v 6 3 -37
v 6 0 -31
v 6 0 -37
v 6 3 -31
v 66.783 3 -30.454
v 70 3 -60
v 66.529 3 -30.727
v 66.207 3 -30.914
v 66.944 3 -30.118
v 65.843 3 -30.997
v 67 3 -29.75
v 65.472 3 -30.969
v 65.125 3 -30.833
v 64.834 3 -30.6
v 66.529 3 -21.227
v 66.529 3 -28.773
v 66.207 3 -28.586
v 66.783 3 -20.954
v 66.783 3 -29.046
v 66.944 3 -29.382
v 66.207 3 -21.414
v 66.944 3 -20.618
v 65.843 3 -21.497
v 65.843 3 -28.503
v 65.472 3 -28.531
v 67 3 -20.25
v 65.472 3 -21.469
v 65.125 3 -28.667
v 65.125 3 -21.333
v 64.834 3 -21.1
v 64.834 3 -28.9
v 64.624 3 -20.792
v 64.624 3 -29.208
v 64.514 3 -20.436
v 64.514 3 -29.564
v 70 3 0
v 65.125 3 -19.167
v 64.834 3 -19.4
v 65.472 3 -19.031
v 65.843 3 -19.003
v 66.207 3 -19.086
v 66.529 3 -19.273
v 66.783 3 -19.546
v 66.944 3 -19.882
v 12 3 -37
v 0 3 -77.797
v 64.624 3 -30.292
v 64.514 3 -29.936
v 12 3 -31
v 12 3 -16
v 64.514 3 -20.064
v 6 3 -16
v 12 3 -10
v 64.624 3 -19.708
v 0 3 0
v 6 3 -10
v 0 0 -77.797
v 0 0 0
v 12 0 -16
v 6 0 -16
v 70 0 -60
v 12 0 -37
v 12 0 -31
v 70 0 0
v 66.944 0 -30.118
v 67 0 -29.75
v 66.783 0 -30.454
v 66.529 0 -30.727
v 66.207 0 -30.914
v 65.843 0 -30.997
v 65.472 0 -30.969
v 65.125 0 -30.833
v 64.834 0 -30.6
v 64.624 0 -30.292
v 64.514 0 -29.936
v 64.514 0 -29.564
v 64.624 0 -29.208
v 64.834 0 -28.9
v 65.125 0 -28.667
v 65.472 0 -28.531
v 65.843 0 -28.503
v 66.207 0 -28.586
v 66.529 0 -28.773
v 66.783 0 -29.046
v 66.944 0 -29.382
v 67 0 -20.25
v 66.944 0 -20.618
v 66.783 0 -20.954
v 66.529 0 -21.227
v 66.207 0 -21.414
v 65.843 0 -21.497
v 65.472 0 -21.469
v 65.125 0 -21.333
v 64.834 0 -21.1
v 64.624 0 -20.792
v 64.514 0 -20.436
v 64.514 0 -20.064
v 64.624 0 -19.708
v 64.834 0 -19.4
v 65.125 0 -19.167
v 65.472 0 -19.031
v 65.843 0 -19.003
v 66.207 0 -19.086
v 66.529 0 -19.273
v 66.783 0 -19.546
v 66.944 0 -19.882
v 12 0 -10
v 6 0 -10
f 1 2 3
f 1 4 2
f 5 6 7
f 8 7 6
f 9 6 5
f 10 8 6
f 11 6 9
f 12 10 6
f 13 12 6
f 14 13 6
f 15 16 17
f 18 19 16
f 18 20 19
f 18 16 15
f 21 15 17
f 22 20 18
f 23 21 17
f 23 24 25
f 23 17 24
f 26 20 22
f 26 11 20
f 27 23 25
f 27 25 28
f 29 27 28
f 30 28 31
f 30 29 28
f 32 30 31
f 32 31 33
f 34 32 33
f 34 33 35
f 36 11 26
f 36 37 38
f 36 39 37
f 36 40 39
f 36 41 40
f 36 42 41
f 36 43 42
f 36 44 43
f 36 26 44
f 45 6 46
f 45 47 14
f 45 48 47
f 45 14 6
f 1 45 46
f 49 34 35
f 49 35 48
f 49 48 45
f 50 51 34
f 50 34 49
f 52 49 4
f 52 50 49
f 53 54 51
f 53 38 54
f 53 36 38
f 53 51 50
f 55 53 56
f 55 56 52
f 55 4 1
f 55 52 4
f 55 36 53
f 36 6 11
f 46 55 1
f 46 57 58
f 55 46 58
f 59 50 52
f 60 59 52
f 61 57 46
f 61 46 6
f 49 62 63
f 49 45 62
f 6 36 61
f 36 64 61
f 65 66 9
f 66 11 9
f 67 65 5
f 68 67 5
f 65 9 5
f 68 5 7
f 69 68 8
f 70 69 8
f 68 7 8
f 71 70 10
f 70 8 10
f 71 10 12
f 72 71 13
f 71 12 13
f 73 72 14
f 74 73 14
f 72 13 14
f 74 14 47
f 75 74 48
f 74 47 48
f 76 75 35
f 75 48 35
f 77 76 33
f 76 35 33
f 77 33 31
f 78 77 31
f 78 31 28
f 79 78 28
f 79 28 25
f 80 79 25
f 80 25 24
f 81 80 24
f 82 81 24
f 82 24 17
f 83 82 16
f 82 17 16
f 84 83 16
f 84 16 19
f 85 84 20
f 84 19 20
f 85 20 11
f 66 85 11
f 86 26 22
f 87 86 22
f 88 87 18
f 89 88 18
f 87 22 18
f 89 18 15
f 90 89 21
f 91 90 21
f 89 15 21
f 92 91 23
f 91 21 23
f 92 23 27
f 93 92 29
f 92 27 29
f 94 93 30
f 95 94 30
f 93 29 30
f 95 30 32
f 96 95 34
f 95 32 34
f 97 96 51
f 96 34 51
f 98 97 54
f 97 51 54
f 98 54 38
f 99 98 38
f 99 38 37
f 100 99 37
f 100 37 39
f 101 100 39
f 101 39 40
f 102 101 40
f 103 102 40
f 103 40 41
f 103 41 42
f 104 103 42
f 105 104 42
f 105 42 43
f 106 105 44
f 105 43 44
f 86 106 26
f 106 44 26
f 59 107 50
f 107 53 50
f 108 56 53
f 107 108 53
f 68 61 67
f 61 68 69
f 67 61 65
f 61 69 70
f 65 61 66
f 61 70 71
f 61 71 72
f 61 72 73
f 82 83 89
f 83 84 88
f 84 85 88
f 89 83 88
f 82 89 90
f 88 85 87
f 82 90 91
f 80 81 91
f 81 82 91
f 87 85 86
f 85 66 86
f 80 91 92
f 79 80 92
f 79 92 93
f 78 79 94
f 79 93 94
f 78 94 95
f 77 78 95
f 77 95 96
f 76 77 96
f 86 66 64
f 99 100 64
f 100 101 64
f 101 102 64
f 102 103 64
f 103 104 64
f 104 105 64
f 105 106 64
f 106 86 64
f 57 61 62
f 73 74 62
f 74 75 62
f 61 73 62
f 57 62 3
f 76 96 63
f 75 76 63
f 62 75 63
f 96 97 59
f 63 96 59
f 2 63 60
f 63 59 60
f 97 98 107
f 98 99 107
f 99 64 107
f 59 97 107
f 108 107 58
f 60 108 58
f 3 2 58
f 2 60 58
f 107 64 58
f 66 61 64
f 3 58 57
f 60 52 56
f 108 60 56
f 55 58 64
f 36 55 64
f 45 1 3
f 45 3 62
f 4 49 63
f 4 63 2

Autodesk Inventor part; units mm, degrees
ref_plane "YZ Plane" through (0, 0, 0) normal (1, 0, 0) x (0, 1, 0)
ref_plane "XZ Plane" through (0, 0, 0) normal (0, 1, 0) x (-1, 0, 0)
ref_plane "XY Plane" through (0, 0, 0) normal (0, 0, 1) x (1, 0, 0)
sketch "Sketch1" plane through (0, 0, 0) normal (0, 1, 0) x (-1, 0, 0)
  line L0 (0, 0) -> (-70, 0)
  line L1 (-70, 0) -> (-70, -60)
  line L2 (-70, -60) -> (0, -60)
  line L3 (0, -60) -> (0, 0)
  line L4 (0, -60) -> (0, -77.7966)
  line L5 (0, -77.7966) -> (-70, -60)
  dimension "d0" = 70
  dimension "d1" = 60
  dimension "d23" = 14.264
extrude "Extrusion1" add sketch "Sketch1" along normal blind 3
sketch "Sketch3" plane through (0, 3, 0) normal (0, 1, 0) x (1, 0, 0)
  circle A0 centre (65.75, 20.25) radius 1.25
  circle A1 centre (65.75, 29.75) radius 1.25
  line L0 (70, 0) -> (70, 60) projected
  line L1 (0, 0) -> (70, 0) projected
  line L2 (6, 10) -> (12, 10)
  line L3 (12, 10) -> (12, 16)
  line L4 (12, 16) -> (6, 16)
  line L5 (6, 16) -> (6, 10)
  line L6 (6, 37) -> (12, 37)
  line L7 (12, 37) -> (12, 31)
  line L8 (12, 31) -> (6, 31)
  line L9 (6, 31) -> (6, 37)
  line L10 (0, 77.7966) -> (0, 0) projected
  dimension "d15" = 2.5
  dimension "d16" = 4.25
  dimension "d17" = 4.25
  dimension "d18" = 2.5
  dimension "d19" = 20.25
  dimension "d20" = 9.5
  dimension "d24" = 6
  dimension "d25" = 6
  dimension "d26" = 6
  dimension "d27" = 10
  dimension "d28" = 15
  dimension "d29" = 6
extrude "Extrusion3" cut sketch "Sketch3" along normal through all both and the other way through all
equation "\"d17\" = d16"
equation "\"d18\" = d15"
properties part number "pinball-case-left-wall-outer-scaled"
